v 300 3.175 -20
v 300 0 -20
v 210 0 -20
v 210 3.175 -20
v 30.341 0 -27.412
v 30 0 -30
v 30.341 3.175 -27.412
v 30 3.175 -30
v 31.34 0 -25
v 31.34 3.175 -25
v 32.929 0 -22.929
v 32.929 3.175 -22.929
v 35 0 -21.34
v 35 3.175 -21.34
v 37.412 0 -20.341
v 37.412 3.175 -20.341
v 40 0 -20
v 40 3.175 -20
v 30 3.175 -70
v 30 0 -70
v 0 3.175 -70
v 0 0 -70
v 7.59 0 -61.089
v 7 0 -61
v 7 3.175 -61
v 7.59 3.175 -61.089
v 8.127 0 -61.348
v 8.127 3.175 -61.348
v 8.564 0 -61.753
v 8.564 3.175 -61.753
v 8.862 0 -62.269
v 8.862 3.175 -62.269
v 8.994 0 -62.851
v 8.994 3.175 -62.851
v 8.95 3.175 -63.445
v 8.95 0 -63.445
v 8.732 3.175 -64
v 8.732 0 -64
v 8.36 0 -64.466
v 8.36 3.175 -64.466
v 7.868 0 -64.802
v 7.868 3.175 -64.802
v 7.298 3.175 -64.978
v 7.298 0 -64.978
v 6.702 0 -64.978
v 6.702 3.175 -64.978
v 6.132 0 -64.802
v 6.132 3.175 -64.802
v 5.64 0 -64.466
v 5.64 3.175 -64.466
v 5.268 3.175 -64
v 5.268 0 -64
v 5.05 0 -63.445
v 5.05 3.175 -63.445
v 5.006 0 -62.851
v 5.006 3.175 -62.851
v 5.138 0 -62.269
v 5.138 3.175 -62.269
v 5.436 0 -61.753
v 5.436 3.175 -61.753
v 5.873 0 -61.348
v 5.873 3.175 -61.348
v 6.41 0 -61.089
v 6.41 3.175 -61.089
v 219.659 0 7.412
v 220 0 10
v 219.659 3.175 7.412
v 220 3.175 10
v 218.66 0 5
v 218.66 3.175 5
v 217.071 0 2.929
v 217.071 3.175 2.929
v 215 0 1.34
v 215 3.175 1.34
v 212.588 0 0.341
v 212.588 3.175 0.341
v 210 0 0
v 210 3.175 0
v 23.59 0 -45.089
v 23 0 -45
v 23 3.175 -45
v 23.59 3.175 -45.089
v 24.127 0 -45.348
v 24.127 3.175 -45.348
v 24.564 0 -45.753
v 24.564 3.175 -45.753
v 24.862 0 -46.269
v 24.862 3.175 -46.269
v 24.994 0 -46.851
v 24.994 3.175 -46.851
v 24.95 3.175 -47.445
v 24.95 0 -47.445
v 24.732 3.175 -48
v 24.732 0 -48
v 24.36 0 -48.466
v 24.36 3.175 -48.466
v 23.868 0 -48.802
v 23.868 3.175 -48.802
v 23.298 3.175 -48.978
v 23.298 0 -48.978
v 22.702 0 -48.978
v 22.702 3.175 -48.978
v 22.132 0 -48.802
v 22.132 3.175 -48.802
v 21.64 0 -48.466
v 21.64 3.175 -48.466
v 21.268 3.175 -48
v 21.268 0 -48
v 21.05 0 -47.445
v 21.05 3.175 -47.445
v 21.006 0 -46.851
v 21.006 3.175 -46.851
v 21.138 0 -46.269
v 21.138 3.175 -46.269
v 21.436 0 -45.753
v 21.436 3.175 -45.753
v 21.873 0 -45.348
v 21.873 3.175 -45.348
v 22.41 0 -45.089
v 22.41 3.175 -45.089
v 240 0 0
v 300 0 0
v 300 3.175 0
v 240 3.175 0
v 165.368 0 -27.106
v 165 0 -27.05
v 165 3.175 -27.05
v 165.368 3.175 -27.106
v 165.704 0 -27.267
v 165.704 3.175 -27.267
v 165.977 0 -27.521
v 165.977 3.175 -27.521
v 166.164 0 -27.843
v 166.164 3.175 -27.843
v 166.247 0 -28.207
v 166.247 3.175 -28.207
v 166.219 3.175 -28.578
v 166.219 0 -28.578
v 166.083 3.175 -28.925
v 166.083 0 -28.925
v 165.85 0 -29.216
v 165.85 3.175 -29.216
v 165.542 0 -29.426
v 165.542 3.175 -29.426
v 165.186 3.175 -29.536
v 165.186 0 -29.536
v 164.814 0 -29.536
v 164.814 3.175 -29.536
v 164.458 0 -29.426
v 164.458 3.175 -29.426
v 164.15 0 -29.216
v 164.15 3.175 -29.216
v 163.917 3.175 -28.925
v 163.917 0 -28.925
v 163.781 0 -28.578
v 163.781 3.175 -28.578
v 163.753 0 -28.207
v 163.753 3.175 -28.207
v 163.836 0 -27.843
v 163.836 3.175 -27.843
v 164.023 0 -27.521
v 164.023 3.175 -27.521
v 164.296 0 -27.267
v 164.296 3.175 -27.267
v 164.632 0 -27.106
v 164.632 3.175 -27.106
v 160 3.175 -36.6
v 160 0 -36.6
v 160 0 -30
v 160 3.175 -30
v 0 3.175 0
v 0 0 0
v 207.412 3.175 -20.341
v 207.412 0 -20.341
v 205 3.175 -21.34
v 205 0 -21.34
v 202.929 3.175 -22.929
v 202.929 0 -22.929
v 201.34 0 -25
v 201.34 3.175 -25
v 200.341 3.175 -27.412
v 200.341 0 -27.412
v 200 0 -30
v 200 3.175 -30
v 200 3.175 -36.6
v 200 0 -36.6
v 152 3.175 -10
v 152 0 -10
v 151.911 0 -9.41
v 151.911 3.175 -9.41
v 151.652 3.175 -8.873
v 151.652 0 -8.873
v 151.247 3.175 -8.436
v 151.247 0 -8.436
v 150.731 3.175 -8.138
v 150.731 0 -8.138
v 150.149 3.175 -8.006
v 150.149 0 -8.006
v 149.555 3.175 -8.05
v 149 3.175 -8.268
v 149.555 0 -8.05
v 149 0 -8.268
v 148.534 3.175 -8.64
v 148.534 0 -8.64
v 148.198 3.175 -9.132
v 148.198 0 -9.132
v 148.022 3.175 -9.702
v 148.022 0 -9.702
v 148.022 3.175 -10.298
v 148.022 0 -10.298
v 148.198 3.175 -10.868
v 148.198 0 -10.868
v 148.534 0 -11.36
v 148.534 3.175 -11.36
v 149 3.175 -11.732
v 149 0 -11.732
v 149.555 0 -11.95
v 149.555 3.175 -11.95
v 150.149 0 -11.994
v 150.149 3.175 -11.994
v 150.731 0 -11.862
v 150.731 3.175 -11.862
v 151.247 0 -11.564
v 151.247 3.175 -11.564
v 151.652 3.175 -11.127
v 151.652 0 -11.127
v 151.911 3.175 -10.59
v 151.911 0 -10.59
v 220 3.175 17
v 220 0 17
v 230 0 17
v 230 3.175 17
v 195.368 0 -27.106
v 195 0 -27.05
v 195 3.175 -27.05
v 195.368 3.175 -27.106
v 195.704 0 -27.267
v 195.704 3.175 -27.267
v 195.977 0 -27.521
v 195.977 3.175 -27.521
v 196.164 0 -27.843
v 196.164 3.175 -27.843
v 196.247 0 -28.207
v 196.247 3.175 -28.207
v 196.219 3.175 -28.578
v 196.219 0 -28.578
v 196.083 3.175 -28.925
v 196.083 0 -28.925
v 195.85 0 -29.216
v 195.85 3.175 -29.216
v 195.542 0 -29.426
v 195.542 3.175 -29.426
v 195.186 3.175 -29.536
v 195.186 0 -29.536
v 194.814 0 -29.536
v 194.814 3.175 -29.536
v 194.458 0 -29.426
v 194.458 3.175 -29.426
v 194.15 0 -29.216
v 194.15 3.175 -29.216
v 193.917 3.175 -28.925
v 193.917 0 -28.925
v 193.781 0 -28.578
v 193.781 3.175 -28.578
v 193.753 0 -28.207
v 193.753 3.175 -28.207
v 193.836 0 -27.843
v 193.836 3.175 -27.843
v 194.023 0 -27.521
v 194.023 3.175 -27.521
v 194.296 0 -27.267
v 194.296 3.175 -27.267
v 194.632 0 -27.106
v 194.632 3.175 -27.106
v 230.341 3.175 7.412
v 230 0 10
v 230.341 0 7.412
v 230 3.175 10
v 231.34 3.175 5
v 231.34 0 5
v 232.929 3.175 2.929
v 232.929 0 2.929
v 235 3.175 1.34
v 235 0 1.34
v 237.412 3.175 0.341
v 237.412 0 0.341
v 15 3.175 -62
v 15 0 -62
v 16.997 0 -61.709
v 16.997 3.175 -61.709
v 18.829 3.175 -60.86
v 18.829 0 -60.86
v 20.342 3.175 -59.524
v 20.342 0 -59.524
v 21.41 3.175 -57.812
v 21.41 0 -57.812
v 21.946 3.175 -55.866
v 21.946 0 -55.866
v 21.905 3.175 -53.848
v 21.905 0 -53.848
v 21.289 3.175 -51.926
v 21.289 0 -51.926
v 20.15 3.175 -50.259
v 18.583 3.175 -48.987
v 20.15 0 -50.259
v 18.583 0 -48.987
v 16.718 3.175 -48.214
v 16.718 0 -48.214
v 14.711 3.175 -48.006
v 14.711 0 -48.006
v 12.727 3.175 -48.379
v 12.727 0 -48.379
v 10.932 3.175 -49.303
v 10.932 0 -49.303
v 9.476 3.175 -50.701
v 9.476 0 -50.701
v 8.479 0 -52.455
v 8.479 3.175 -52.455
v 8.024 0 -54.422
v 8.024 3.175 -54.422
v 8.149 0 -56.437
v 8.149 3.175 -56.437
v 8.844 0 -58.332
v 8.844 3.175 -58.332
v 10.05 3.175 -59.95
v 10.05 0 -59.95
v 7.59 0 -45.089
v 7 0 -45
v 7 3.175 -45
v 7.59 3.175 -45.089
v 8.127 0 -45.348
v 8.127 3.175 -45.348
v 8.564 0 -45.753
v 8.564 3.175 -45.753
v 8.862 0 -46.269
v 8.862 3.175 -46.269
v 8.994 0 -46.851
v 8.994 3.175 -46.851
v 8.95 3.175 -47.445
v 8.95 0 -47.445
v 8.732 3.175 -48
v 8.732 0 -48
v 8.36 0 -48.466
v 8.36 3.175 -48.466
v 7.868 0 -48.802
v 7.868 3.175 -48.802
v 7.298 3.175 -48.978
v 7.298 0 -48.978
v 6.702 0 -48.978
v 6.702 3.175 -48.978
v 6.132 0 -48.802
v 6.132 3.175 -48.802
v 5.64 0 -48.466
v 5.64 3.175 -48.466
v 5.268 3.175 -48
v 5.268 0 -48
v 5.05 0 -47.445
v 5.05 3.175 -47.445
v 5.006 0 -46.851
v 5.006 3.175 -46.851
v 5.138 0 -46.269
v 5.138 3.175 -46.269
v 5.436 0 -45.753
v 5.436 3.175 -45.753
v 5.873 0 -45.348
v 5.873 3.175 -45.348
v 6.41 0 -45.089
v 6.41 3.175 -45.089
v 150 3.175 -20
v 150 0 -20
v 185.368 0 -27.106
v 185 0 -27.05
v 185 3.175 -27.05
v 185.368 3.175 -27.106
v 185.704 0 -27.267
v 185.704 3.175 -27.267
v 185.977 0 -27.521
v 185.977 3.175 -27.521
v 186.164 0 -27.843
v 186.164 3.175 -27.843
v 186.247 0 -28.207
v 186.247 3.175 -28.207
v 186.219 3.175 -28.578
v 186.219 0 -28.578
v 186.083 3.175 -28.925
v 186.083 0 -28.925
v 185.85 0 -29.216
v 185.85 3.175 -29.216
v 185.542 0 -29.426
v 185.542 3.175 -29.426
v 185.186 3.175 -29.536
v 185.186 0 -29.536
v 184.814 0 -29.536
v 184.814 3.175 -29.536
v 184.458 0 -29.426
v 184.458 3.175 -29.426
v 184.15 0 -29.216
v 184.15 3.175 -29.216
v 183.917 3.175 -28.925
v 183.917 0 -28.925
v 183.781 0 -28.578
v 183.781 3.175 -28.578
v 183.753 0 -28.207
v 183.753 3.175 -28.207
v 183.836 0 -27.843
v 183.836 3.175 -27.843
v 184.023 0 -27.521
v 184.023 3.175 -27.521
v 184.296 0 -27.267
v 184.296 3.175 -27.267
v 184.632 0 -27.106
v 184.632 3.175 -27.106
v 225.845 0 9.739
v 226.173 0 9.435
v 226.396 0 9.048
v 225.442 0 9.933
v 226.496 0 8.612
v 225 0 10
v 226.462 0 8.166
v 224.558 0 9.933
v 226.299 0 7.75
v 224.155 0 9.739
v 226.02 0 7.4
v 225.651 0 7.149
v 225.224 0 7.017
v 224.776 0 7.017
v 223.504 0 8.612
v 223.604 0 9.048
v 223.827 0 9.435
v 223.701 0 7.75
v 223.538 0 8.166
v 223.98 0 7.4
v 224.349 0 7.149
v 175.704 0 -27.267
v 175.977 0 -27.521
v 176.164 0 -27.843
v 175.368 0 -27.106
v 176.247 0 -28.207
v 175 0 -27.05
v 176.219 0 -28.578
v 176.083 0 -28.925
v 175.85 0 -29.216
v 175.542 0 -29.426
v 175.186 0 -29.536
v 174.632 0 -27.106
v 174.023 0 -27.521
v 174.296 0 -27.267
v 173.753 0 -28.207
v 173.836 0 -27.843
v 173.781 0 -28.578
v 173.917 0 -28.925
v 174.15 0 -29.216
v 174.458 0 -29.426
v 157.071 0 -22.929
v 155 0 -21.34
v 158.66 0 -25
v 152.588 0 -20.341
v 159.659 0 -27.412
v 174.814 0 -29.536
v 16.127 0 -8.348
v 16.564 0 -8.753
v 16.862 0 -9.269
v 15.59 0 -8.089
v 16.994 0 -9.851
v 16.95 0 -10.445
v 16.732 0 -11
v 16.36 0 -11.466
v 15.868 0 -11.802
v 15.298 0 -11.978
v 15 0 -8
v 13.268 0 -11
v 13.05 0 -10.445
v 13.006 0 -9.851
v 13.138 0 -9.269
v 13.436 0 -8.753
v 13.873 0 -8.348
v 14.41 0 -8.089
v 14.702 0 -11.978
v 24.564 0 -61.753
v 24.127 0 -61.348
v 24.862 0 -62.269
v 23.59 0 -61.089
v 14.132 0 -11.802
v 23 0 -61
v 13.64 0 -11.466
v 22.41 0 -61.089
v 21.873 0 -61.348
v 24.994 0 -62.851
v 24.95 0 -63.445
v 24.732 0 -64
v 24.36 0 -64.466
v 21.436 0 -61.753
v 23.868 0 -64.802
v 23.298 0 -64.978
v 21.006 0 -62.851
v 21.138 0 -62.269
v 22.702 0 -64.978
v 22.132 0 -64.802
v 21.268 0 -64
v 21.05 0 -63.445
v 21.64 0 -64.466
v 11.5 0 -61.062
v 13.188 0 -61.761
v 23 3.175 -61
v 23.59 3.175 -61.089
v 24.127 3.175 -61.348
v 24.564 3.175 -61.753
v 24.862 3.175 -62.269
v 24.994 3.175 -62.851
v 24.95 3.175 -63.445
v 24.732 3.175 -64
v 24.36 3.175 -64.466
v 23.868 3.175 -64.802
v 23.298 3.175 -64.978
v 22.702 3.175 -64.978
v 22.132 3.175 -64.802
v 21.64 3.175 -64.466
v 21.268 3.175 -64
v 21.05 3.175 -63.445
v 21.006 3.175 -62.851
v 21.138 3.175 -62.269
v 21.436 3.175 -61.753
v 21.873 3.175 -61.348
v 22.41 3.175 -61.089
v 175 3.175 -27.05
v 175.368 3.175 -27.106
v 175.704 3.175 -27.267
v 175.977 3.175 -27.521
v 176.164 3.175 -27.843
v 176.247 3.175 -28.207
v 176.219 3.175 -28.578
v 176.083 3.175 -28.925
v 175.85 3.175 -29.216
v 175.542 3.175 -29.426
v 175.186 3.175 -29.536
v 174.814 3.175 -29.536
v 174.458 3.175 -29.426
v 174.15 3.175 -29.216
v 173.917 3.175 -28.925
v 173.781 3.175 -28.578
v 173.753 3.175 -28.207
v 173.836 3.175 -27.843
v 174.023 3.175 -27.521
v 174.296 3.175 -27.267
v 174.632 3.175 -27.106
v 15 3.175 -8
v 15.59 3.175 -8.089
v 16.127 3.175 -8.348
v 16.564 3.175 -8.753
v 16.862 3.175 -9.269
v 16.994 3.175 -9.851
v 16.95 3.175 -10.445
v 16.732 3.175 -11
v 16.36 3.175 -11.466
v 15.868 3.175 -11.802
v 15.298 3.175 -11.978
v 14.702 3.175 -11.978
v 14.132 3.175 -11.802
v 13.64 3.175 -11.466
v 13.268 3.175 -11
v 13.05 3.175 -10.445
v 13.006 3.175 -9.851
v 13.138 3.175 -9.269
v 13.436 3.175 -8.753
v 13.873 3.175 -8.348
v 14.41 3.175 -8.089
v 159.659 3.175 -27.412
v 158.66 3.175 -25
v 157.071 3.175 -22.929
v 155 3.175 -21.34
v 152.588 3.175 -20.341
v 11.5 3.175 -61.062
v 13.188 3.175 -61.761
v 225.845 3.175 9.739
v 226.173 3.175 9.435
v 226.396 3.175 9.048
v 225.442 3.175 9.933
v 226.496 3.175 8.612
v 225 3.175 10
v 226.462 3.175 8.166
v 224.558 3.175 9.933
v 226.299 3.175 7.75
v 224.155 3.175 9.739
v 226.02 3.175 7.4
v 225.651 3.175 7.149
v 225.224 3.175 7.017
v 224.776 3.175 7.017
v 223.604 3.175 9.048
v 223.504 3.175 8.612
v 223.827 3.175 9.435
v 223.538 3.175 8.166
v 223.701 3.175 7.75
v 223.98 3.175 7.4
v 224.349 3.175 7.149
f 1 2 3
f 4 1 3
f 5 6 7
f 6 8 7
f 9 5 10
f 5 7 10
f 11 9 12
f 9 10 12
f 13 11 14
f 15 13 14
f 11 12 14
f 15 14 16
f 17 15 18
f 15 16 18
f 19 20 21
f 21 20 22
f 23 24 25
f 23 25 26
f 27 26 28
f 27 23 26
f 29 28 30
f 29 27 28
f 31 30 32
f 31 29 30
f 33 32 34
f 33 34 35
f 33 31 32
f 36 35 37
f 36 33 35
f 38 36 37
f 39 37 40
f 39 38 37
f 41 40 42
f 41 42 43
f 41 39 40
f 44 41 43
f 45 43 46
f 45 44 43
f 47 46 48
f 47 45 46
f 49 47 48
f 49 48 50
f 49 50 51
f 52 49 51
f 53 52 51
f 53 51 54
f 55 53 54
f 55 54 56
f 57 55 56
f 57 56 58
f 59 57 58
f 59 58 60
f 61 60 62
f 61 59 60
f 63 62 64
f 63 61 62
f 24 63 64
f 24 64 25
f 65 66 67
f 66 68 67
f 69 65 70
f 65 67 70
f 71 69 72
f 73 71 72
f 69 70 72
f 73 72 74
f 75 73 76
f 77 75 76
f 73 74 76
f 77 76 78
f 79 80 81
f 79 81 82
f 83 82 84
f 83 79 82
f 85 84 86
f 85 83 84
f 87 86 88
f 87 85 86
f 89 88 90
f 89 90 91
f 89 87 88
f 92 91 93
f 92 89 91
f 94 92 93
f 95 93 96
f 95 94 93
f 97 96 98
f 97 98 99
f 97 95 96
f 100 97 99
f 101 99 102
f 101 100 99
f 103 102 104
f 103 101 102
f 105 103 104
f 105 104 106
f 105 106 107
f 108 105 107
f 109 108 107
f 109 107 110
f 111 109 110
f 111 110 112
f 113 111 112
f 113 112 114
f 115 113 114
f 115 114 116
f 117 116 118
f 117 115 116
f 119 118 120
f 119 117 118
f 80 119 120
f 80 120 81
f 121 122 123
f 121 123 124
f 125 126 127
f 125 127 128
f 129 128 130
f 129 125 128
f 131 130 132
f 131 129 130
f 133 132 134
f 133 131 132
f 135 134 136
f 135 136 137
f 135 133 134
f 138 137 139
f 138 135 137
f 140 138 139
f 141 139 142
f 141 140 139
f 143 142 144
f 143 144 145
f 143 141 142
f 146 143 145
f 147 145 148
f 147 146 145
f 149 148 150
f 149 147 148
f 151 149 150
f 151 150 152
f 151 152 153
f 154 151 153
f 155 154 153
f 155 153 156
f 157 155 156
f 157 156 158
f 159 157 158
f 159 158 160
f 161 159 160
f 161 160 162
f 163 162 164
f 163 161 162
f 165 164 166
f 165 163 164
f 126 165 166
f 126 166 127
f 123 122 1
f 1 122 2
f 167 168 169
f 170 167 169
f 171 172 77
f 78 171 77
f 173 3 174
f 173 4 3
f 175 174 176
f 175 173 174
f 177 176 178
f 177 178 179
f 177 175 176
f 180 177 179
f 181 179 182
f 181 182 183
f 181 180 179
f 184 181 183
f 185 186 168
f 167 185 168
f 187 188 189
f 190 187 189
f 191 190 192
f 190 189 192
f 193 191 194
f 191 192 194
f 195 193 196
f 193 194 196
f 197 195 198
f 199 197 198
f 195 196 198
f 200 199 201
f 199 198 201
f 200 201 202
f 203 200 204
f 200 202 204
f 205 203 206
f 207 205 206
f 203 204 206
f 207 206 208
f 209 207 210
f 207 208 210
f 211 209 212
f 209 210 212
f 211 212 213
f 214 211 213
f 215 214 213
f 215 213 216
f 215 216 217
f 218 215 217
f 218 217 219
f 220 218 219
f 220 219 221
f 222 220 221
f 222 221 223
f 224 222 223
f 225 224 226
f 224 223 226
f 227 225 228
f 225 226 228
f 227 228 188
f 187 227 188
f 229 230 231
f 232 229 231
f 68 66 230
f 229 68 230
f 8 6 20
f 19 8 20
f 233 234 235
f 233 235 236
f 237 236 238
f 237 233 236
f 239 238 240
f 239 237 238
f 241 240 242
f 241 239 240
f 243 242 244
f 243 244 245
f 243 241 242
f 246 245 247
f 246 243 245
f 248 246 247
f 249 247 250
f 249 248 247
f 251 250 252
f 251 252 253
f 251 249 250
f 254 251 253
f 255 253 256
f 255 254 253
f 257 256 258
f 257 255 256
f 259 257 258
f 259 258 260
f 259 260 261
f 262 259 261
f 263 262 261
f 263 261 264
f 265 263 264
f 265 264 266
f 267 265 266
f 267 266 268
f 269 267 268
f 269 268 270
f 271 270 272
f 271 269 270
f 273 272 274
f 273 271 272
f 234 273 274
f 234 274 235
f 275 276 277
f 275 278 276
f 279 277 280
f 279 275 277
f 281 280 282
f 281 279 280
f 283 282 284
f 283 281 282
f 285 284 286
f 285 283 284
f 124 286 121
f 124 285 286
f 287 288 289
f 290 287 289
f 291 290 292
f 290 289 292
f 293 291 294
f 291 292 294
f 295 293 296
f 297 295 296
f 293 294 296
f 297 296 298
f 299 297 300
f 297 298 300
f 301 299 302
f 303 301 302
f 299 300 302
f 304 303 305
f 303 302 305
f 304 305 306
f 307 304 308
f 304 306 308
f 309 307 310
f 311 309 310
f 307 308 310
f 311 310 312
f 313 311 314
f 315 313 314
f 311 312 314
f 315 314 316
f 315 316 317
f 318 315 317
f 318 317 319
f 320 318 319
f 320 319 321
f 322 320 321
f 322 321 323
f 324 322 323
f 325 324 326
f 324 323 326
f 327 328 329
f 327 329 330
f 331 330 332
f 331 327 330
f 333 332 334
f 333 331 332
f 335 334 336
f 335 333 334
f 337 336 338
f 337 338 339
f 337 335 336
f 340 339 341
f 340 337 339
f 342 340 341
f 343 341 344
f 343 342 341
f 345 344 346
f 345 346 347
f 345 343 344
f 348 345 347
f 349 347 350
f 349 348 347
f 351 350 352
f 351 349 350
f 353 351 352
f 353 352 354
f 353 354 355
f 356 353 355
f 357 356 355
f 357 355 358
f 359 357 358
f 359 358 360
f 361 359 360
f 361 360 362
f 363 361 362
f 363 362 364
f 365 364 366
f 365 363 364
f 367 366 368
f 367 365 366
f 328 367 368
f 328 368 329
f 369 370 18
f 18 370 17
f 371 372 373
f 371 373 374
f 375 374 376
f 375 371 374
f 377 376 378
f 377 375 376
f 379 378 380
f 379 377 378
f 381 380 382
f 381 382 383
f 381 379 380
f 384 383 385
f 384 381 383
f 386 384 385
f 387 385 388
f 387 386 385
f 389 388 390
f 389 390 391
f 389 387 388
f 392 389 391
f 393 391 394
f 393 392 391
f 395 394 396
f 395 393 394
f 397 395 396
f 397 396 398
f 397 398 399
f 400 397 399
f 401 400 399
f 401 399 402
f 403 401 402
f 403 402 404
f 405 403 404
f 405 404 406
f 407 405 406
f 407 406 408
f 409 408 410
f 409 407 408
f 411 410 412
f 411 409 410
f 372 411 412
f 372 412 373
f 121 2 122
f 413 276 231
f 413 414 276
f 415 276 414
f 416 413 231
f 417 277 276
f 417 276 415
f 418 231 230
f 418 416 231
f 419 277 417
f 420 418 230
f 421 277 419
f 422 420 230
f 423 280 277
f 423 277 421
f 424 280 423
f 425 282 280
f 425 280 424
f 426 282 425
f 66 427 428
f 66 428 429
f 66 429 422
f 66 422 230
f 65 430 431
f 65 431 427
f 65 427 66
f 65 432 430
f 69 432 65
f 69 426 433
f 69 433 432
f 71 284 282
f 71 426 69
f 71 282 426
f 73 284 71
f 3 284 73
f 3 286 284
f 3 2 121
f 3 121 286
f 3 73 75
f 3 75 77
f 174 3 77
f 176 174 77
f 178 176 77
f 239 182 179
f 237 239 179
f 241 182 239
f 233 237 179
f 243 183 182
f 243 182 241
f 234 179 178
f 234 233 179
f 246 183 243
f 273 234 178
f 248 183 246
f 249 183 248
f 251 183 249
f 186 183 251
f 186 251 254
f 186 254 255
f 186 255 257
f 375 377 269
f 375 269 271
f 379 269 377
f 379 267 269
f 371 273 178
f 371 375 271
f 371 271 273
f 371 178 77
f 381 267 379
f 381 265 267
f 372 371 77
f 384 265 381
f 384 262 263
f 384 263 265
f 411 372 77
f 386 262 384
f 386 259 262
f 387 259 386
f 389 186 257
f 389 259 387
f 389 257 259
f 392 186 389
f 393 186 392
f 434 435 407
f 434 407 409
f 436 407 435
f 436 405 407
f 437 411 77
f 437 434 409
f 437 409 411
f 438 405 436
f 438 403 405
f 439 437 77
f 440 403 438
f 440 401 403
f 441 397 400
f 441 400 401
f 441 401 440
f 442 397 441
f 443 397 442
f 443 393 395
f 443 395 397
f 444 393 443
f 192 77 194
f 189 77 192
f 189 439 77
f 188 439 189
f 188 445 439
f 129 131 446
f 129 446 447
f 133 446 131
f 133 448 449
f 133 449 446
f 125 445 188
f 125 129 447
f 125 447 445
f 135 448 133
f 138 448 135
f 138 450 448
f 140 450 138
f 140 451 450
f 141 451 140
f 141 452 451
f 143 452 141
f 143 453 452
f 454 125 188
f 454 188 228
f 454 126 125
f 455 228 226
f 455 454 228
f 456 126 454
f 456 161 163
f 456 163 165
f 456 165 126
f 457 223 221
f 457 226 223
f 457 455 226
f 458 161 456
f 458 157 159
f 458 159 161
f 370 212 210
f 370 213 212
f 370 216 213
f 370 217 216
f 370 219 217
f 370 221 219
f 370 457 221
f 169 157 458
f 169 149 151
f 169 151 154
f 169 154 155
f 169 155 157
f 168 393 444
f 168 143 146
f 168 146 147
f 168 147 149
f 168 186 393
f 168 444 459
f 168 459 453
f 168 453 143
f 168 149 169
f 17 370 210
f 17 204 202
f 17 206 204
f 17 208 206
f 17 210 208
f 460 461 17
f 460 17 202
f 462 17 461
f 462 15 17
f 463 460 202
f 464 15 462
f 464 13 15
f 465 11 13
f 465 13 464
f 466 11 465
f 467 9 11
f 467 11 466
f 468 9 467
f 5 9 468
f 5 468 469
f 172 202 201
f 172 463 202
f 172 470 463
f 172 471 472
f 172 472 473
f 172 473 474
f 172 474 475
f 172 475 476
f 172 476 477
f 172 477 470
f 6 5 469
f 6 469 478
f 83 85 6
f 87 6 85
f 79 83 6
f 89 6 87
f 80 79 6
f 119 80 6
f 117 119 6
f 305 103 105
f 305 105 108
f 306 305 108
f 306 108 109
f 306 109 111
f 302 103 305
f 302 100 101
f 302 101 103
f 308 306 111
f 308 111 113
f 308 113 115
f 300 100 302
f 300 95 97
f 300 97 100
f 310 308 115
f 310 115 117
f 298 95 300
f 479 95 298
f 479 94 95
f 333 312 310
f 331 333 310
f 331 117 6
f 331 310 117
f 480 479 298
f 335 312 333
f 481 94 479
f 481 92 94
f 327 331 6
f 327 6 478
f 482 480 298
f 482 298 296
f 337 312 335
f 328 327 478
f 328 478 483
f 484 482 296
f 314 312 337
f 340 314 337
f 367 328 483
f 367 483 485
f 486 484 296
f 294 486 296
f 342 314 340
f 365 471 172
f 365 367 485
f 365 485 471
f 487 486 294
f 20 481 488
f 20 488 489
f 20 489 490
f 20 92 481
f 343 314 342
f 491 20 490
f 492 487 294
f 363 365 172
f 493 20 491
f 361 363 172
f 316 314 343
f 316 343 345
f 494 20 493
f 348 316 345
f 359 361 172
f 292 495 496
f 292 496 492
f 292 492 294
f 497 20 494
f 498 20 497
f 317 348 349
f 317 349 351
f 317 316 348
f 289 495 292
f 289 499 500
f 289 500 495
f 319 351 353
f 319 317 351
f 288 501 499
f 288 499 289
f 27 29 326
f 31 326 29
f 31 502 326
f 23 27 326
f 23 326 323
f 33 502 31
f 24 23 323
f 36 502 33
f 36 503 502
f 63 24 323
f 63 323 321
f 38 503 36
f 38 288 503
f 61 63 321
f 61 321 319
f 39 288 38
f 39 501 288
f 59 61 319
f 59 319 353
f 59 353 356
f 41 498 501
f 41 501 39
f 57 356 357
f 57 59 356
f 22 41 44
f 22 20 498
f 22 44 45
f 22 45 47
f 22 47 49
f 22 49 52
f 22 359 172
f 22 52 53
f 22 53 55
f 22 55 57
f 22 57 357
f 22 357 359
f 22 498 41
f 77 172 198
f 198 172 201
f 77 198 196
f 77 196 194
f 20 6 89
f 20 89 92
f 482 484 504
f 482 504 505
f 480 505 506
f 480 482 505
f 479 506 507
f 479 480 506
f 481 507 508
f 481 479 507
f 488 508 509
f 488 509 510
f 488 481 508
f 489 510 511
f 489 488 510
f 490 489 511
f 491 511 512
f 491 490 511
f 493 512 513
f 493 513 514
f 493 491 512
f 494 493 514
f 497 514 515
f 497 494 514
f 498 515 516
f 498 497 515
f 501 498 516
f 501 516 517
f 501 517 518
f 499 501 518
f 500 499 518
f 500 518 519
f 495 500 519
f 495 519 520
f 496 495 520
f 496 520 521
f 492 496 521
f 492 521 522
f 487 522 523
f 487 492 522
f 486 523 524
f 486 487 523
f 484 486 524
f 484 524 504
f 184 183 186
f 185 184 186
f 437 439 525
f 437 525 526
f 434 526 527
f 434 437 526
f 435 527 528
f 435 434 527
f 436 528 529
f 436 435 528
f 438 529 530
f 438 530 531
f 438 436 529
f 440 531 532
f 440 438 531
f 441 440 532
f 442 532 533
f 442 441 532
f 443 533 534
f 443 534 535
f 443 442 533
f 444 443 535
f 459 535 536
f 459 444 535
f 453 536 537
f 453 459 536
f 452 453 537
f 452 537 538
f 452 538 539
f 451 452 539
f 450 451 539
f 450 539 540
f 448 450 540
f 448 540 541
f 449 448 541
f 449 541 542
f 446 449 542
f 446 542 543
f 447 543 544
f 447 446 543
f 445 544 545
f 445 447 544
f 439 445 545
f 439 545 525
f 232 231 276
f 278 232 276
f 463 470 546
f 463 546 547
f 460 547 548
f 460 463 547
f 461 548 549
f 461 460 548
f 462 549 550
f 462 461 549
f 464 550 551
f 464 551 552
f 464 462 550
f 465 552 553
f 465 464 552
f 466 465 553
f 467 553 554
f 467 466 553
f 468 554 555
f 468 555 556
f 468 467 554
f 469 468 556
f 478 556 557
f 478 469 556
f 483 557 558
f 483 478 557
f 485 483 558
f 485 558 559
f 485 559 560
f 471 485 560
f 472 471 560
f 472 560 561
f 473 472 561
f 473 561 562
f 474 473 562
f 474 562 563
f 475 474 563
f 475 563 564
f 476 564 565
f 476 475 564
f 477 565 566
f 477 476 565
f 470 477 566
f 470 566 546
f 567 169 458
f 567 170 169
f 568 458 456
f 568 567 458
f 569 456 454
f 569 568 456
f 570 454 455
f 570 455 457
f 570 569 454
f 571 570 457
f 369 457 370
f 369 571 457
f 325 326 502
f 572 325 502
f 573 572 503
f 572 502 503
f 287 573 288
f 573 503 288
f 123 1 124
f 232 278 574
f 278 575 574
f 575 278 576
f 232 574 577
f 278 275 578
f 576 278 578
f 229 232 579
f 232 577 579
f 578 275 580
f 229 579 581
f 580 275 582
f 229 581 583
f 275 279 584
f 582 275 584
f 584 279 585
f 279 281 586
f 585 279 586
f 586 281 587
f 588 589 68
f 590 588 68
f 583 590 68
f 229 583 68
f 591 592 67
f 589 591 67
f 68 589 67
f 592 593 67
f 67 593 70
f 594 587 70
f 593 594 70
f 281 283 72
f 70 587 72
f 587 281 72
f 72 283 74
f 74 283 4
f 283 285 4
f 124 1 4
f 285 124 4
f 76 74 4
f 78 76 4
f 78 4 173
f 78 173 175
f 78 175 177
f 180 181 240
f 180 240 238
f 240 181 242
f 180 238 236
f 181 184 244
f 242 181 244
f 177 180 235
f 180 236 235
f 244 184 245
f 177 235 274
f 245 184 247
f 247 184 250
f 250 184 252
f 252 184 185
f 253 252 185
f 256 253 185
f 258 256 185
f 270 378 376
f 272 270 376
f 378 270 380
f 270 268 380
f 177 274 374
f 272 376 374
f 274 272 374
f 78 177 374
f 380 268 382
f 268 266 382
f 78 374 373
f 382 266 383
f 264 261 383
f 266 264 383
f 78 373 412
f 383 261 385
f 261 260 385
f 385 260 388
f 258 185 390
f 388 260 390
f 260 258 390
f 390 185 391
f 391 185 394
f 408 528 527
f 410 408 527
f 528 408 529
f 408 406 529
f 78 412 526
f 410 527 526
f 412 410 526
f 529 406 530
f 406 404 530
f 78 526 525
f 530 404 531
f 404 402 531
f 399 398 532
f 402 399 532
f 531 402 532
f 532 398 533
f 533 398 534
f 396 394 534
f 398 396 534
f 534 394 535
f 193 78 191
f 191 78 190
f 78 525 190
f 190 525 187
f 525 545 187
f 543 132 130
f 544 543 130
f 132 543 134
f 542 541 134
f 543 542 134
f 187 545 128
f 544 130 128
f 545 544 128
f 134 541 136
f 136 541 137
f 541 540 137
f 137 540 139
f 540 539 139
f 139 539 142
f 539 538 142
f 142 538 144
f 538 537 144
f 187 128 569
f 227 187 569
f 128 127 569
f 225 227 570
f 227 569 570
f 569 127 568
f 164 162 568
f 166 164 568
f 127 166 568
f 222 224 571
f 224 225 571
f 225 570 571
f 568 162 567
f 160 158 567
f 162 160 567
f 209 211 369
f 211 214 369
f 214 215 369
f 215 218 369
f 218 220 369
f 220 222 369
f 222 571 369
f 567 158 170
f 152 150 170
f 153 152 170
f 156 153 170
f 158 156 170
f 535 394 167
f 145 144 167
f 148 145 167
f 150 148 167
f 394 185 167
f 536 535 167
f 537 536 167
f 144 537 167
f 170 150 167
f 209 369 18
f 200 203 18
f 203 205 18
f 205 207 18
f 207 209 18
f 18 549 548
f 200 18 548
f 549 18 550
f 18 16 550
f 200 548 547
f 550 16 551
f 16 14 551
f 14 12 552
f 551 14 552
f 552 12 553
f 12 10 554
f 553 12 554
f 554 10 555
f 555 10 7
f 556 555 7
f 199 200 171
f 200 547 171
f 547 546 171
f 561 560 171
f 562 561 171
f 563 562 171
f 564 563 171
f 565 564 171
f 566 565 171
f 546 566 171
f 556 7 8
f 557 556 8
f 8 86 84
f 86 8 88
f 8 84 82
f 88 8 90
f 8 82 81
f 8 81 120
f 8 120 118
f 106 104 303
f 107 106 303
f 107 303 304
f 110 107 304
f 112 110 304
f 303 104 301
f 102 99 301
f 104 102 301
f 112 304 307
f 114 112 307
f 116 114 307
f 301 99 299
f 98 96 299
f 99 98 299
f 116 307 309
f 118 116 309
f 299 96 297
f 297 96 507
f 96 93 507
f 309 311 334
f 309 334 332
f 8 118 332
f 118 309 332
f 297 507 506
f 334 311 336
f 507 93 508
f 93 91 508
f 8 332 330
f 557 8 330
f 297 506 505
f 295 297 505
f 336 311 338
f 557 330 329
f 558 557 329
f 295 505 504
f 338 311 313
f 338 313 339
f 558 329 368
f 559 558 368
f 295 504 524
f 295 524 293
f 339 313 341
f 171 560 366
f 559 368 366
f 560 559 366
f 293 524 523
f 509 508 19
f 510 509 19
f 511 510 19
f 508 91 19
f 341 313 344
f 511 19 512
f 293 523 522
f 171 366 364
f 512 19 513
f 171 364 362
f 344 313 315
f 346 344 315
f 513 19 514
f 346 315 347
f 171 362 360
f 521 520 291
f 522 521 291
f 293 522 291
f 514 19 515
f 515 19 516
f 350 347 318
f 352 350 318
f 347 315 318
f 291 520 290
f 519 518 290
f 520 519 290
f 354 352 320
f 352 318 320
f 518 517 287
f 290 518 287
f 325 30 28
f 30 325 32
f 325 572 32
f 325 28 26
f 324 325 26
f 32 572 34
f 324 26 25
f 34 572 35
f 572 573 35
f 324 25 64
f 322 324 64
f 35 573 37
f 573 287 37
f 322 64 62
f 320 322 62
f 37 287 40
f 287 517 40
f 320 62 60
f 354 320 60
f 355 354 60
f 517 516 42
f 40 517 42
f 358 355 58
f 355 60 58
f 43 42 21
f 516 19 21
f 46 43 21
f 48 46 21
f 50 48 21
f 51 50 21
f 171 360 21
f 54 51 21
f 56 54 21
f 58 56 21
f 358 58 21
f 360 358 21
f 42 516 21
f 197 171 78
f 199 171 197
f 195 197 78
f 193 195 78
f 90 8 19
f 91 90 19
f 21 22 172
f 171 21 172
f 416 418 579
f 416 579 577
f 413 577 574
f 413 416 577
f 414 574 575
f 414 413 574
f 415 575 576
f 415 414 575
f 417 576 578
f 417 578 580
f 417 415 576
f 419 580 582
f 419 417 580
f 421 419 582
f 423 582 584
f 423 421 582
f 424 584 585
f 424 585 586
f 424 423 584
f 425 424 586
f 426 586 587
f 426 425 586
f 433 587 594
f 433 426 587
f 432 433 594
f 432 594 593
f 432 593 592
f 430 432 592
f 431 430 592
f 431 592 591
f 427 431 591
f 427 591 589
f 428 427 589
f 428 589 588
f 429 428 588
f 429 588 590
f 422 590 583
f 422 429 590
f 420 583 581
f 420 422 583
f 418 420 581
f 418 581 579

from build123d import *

# Parameters (mm, degrees)
SKETCH1_R           = 1.5
SKETCH1_R_2         = 2
SKETCH1_R_3         = 1.25
BOSS_EXTRUDE1_DEPTH = 3.175
FILLET1_R           = 10
SKETCH2_W           = 70
SKETCH2_H           = 20
BOSS_EXTRUDE2_DEPTH = 3.175
FILLET2_R           = 10


with BuildPart() as part:
    # Sketch1 → Boss-Extrude1 (new body)
    with BuildSketch(Plane(origin=(0, 0, 0), x_dir=(1, 0, 0), z_dir=(0, 1, 0))):
        Polygon((220, -17), (225, -17), (230, -17), (230, 10), (230, 20), (200, 20), (200, 36.6), (195, 36.6), (160, 36.6), (160, 20), (30, 20), (30, 70), (15, 70), (0, 70), (0, 0), (220, 0), align=None)
        with Locations((225, -8.5)):
            Circle(SKETCH1_R, mode=Mode.SUBTRACT)
        with Locations((15, 10)):
            Circle(SKETCH1_R_2, mode=Mode.SUBTRACT)
        with BuildLine():
            ThreePointArc((148, 10), (150, 12), (152, 10))
            ThreePointArc((152, 10), (150, 8), (148, 10))
        make_face(mode=Mode.SUBTRACT)
        with Locations((7, 47)):
            Circle(SKETCH1_R_2, mode=Mode.SUBTRACT)
        with Locations((23, 47)):
            Circle(SKETCH1_R_2, mode=Mode.SUBTRACT)
        with BuildLine():
            ThreePointArc((10.050252532, 59.949747468), (12.321215973, 61.467156728), (15, 62))
            ThreePointArc((15, 62), (17.678784027, 48.532843272), (10.050252532, 59.949747468))
        make_face(mode=Mode.SUBTRACT)
        with Locations((7, 63)):
            Circle(SKETCH1_R_2, mode=Mode.SUBTRACT)
        with Locations((23, 63)):
            Circle(SKETCH1_R_2, mode=Mode.SUBTRACT)
        with Locations((185, 28.3)):
            Circle(SKETCH1_R_3, mode=Mode.SUBTRACT)
        with Locations((165, 28.3)):
            Circle(SKETCH1_R_3, mode=Mode.SUBTRACT)
        with Locations((175, 28.3)):
            Circle(SKETCH1_R_3, mode=Mode.SUBTRACT)
        with Locations((195, 28.3)):
            Circle(SKETCH1_R_3, mode=Mode.SUBTRACT)
    extrude(amount=BOSS_EXTRUDE1_DEPTH)

    # Fillet1
    fillet1_edges = [part.edges().sort_by_distance(p)[0] for p in [
        (220, 1.5875, 0),
        (200, 1.5875, -20),
        (160, 1.5875, -20),
        (30, 1.5875, -20),
    ]]
    fillet(fillet1_edges, radius=FILLET1_R)

    # Sketch2 → Boss-Extrude2 (add)
    with BuildSketch(Plane(origin=(0, 0, 0), x_dir=(-1, 0, 0), z_dir=(0, -1, 0))):
        with Locations((-265, 10)):
            Rectangle(SKETCH2_W, SKETCH2_H)
    extrude(amount=-BOSS_EXTRUDE2_DEPTH)

    # Fillet2
    fillet2_edges = [part.edges().sort_by_distance(p)[0] for p in [
        (230, 1.5875, 0),
    ]]
    fillet(fillet2_edges, radius=FILLET2_R)


solid = part.part
